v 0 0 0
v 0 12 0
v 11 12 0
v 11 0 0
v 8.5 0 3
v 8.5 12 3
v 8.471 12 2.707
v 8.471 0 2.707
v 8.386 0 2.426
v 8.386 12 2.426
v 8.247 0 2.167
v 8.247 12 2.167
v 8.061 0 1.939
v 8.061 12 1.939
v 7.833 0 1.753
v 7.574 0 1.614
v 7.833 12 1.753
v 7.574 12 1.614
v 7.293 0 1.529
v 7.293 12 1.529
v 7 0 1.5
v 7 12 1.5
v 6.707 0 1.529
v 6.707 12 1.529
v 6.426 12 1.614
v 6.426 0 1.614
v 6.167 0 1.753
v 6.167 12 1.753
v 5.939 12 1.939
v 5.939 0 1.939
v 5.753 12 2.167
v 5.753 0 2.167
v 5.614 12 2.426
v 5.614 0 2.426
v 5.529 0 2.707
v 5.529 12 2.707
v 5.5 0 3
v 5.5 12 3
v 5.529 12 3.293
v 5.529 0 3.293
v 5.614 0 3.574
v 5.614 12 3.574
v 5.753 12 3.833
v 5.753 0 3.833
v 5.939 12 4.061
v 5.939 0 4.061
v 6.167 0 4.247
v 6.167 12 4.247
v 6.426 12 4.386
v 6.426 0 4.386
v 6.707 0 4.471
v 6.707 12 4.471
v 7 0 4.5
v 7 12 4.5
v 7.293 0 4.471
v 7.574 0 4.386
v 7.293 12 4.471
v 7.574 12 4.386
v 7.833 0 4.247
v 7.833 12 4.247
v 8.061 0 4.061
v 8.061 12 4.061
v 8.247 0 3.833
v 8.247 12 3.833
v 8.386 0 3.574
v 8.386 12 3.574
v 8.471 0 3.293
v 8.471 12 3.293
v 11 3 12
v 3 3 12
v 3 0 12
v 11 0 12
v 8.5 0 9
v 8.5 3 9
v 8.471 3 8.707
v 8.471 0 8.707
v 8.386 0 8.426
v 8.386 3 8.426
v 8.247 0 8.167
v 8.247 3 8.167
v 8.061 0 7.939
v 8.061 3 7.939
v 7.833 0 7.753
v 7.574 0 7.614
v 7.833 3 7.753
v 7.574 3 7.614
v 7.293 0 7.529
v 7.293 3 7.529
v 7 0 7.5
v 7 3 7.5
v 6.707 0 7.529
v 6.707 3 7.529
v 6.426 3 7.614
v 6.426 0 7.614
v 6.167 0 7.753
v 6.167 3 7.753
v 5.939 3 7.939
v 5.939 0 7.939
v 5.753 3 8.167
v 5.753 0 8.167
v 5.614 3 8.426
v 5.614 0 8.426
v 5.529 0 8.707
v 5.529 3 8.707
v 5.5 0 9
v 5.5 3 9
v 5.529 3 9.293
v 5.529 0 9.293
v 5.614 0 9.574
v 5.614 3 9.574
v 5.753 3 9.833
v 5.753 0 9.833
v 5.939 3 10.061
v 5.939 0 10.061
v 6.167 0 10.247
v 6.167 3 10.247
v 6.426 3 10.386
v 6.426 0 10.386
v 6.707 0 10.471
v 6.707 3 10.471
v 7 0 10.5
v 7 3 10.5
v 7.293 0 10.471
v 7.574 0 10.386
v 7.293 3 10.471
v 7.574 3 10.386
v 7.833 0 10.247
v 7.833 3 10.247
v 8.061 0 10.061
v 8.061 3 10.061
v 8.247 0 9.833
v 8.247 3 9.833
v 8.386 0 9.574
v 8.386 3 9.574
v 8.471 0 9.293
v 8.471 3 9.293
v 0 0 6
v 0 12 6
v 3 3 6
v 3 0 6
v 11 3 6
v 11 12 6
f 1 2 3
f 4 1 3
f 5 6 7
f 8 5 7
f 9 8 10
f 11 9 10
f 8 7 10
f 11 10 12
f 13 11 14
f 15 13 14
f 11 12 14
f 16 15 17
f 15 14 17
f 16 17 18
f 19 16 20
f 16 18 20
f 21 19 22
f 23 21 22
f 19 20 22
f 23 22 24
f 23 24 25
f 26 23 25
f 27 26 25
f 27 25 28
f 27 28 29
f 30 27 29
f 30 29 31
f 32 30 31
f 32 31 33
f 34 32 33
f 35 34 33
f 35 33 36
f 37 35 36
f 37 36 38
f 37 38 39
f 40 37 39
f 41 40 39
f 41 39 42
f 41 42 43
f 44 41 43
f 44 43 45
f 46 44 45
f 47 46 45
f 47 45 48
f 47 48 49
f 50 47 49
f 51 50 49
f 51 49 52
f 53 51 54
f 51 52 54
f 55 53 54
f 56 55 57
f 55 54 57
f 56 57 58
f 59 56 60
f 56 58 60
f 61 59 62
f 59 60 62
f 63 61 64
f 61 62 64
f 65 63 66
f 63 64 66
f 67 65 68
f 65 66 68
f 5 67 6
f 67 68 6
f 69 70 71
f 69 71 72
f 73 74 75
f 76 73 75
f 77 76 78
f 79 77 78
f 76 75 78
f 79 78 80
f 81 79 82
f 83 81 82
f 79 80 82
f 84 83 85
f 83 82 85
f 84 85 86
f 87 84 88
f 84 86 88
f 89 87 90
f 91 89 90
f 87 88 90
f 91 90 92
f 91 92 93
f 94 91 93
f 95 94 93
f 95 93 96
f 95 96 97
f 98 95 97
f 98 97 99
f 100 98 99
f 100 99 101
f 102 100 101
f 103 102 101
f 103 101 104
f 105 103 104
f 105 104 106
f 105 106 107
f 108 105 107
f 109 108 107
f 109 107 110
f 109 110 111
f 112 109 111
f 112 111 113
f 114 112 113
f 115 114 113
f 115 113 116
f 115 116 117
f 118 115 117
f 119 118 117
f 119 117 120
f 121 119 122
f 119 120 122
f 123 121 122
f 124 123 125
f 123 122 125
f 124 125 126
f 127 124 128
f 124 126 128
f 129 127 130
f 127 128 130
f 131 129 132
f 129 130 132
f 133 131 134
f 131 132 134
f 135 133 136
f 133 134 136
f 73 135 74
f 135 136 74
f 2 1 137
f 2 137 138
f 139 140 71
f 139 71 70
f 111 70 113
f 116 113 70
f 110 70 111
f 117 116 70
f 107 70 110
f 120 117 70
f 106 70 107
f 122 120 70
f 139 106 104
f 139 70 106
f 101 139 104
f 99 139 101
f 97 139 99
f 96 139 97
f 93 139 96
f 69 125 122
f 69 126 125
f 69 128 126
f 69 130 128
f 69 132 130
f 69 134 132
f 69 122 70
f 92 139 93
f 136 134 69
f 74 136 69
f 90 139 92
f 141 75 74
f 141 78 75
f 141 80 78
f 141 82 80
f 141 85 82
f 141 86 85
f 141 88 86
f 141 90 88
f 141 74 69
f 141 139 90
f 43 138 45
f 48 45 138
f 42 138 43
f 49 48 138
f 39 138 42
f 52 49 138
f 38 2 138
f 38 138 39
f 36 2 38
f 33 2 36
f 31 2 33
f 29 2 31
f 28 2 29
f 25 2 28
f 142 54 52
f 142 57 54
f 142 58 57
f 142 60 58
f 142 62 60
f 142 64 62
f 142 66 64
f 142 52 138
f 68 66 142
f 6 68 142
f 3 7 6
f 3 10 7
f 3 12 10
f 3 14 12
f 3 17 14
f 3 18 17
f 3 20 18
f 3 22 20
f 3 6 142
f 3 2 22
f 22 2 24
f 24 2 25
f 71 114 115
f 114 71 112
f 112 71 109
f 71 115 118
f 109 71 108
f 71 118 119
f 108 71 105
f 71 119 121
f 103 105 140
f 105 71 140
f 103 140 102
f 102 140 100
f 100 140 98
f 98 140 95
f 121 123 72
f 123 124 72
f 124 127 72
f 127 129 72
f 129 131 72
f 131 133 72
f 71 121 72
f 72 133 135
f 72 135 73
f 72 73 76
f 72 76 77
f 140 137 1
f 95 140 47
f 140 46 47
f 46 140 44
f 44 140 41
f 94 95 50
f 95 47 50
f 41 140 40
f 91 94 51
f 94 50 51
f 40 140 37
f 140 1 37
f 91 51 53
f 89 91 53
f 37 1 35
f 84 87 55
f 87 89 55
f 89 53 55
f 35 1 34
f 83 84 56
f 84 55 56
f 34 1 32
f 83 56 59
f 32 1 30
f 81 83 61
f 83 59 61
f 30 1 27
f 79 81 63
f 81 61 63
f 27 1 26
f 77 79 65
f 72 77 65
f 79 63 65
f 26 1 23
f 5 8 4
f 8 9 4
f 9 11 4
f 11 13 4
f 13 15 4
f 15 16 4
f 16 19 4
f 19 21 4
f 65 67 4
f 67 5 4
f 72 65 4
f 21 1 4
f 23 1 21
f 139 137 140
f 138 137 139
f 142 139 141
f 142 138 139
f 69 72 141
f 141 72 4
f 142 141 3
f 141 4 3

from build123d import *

# Parameters (mm, degrees)
SKETCH1_W           = 11
SKETCH1_H           = 12
BOSS_EXTRUDE1_DEPTH = 6
SKETCH2_W           = 8
SKETCH2_H           = 3
BOSS_EXTRUDE2_DEPTH = 6
SKETCH3_R           = 1.5
CUT_EXTRUDE1_DEPTH  = 6
SKETCH4_R           = 1.5
CUT_EXTRUDE2_DEPTH  = 16


with BuildPart() as part:
    # Sketch1 → Boss-Extrude1 (new body)
    with BuildSketch(Plane.XY):
        with Locations((5.5, 6)):
            Rectangle(SKETCH1_W, SKETCH1_H)
    extrude(amount=BOSS_EXTRUDE1_DEPTH)

    # Sketch2 → Boss-Extrude2 (add)
    with BuildSketch(Plane.XY.offset(6)):
        with Locations((7, 1.5)):
            Rectangle(SKETCH2_W, SKETCH2_H)
    extrude(amount=BOSS_EXTRUDE2_DEPTH)

    # Sketch3 → Cut-Extrude1 (cut)
    with BuildSketch(Plane(origin=(0, 3, 0), x_dir=(1, 0, 0), z_dir=(0, 1, 0))):
        with Locations((7, -9)):
            Circle(SKETCH3_R)
    extrude(amount=-CUT_EXTRUDE1_DEPTH, mode=Mode.SUBTRACT)

    # Sketch4 → Cut-Extrude2 (cut)
    with BuildSketch(Plane(origin=(0, 12, 0), x_dir=(1, 0, 0), z_dir=(0, 1, 0))):
        with Locations((7, -3)):
            Circle(SKETCH4_R)
    extrude(amount=-CUT_EXTRUDE2_DEPTH, mode=Mode.SUBTRACT)


solid = part.part
